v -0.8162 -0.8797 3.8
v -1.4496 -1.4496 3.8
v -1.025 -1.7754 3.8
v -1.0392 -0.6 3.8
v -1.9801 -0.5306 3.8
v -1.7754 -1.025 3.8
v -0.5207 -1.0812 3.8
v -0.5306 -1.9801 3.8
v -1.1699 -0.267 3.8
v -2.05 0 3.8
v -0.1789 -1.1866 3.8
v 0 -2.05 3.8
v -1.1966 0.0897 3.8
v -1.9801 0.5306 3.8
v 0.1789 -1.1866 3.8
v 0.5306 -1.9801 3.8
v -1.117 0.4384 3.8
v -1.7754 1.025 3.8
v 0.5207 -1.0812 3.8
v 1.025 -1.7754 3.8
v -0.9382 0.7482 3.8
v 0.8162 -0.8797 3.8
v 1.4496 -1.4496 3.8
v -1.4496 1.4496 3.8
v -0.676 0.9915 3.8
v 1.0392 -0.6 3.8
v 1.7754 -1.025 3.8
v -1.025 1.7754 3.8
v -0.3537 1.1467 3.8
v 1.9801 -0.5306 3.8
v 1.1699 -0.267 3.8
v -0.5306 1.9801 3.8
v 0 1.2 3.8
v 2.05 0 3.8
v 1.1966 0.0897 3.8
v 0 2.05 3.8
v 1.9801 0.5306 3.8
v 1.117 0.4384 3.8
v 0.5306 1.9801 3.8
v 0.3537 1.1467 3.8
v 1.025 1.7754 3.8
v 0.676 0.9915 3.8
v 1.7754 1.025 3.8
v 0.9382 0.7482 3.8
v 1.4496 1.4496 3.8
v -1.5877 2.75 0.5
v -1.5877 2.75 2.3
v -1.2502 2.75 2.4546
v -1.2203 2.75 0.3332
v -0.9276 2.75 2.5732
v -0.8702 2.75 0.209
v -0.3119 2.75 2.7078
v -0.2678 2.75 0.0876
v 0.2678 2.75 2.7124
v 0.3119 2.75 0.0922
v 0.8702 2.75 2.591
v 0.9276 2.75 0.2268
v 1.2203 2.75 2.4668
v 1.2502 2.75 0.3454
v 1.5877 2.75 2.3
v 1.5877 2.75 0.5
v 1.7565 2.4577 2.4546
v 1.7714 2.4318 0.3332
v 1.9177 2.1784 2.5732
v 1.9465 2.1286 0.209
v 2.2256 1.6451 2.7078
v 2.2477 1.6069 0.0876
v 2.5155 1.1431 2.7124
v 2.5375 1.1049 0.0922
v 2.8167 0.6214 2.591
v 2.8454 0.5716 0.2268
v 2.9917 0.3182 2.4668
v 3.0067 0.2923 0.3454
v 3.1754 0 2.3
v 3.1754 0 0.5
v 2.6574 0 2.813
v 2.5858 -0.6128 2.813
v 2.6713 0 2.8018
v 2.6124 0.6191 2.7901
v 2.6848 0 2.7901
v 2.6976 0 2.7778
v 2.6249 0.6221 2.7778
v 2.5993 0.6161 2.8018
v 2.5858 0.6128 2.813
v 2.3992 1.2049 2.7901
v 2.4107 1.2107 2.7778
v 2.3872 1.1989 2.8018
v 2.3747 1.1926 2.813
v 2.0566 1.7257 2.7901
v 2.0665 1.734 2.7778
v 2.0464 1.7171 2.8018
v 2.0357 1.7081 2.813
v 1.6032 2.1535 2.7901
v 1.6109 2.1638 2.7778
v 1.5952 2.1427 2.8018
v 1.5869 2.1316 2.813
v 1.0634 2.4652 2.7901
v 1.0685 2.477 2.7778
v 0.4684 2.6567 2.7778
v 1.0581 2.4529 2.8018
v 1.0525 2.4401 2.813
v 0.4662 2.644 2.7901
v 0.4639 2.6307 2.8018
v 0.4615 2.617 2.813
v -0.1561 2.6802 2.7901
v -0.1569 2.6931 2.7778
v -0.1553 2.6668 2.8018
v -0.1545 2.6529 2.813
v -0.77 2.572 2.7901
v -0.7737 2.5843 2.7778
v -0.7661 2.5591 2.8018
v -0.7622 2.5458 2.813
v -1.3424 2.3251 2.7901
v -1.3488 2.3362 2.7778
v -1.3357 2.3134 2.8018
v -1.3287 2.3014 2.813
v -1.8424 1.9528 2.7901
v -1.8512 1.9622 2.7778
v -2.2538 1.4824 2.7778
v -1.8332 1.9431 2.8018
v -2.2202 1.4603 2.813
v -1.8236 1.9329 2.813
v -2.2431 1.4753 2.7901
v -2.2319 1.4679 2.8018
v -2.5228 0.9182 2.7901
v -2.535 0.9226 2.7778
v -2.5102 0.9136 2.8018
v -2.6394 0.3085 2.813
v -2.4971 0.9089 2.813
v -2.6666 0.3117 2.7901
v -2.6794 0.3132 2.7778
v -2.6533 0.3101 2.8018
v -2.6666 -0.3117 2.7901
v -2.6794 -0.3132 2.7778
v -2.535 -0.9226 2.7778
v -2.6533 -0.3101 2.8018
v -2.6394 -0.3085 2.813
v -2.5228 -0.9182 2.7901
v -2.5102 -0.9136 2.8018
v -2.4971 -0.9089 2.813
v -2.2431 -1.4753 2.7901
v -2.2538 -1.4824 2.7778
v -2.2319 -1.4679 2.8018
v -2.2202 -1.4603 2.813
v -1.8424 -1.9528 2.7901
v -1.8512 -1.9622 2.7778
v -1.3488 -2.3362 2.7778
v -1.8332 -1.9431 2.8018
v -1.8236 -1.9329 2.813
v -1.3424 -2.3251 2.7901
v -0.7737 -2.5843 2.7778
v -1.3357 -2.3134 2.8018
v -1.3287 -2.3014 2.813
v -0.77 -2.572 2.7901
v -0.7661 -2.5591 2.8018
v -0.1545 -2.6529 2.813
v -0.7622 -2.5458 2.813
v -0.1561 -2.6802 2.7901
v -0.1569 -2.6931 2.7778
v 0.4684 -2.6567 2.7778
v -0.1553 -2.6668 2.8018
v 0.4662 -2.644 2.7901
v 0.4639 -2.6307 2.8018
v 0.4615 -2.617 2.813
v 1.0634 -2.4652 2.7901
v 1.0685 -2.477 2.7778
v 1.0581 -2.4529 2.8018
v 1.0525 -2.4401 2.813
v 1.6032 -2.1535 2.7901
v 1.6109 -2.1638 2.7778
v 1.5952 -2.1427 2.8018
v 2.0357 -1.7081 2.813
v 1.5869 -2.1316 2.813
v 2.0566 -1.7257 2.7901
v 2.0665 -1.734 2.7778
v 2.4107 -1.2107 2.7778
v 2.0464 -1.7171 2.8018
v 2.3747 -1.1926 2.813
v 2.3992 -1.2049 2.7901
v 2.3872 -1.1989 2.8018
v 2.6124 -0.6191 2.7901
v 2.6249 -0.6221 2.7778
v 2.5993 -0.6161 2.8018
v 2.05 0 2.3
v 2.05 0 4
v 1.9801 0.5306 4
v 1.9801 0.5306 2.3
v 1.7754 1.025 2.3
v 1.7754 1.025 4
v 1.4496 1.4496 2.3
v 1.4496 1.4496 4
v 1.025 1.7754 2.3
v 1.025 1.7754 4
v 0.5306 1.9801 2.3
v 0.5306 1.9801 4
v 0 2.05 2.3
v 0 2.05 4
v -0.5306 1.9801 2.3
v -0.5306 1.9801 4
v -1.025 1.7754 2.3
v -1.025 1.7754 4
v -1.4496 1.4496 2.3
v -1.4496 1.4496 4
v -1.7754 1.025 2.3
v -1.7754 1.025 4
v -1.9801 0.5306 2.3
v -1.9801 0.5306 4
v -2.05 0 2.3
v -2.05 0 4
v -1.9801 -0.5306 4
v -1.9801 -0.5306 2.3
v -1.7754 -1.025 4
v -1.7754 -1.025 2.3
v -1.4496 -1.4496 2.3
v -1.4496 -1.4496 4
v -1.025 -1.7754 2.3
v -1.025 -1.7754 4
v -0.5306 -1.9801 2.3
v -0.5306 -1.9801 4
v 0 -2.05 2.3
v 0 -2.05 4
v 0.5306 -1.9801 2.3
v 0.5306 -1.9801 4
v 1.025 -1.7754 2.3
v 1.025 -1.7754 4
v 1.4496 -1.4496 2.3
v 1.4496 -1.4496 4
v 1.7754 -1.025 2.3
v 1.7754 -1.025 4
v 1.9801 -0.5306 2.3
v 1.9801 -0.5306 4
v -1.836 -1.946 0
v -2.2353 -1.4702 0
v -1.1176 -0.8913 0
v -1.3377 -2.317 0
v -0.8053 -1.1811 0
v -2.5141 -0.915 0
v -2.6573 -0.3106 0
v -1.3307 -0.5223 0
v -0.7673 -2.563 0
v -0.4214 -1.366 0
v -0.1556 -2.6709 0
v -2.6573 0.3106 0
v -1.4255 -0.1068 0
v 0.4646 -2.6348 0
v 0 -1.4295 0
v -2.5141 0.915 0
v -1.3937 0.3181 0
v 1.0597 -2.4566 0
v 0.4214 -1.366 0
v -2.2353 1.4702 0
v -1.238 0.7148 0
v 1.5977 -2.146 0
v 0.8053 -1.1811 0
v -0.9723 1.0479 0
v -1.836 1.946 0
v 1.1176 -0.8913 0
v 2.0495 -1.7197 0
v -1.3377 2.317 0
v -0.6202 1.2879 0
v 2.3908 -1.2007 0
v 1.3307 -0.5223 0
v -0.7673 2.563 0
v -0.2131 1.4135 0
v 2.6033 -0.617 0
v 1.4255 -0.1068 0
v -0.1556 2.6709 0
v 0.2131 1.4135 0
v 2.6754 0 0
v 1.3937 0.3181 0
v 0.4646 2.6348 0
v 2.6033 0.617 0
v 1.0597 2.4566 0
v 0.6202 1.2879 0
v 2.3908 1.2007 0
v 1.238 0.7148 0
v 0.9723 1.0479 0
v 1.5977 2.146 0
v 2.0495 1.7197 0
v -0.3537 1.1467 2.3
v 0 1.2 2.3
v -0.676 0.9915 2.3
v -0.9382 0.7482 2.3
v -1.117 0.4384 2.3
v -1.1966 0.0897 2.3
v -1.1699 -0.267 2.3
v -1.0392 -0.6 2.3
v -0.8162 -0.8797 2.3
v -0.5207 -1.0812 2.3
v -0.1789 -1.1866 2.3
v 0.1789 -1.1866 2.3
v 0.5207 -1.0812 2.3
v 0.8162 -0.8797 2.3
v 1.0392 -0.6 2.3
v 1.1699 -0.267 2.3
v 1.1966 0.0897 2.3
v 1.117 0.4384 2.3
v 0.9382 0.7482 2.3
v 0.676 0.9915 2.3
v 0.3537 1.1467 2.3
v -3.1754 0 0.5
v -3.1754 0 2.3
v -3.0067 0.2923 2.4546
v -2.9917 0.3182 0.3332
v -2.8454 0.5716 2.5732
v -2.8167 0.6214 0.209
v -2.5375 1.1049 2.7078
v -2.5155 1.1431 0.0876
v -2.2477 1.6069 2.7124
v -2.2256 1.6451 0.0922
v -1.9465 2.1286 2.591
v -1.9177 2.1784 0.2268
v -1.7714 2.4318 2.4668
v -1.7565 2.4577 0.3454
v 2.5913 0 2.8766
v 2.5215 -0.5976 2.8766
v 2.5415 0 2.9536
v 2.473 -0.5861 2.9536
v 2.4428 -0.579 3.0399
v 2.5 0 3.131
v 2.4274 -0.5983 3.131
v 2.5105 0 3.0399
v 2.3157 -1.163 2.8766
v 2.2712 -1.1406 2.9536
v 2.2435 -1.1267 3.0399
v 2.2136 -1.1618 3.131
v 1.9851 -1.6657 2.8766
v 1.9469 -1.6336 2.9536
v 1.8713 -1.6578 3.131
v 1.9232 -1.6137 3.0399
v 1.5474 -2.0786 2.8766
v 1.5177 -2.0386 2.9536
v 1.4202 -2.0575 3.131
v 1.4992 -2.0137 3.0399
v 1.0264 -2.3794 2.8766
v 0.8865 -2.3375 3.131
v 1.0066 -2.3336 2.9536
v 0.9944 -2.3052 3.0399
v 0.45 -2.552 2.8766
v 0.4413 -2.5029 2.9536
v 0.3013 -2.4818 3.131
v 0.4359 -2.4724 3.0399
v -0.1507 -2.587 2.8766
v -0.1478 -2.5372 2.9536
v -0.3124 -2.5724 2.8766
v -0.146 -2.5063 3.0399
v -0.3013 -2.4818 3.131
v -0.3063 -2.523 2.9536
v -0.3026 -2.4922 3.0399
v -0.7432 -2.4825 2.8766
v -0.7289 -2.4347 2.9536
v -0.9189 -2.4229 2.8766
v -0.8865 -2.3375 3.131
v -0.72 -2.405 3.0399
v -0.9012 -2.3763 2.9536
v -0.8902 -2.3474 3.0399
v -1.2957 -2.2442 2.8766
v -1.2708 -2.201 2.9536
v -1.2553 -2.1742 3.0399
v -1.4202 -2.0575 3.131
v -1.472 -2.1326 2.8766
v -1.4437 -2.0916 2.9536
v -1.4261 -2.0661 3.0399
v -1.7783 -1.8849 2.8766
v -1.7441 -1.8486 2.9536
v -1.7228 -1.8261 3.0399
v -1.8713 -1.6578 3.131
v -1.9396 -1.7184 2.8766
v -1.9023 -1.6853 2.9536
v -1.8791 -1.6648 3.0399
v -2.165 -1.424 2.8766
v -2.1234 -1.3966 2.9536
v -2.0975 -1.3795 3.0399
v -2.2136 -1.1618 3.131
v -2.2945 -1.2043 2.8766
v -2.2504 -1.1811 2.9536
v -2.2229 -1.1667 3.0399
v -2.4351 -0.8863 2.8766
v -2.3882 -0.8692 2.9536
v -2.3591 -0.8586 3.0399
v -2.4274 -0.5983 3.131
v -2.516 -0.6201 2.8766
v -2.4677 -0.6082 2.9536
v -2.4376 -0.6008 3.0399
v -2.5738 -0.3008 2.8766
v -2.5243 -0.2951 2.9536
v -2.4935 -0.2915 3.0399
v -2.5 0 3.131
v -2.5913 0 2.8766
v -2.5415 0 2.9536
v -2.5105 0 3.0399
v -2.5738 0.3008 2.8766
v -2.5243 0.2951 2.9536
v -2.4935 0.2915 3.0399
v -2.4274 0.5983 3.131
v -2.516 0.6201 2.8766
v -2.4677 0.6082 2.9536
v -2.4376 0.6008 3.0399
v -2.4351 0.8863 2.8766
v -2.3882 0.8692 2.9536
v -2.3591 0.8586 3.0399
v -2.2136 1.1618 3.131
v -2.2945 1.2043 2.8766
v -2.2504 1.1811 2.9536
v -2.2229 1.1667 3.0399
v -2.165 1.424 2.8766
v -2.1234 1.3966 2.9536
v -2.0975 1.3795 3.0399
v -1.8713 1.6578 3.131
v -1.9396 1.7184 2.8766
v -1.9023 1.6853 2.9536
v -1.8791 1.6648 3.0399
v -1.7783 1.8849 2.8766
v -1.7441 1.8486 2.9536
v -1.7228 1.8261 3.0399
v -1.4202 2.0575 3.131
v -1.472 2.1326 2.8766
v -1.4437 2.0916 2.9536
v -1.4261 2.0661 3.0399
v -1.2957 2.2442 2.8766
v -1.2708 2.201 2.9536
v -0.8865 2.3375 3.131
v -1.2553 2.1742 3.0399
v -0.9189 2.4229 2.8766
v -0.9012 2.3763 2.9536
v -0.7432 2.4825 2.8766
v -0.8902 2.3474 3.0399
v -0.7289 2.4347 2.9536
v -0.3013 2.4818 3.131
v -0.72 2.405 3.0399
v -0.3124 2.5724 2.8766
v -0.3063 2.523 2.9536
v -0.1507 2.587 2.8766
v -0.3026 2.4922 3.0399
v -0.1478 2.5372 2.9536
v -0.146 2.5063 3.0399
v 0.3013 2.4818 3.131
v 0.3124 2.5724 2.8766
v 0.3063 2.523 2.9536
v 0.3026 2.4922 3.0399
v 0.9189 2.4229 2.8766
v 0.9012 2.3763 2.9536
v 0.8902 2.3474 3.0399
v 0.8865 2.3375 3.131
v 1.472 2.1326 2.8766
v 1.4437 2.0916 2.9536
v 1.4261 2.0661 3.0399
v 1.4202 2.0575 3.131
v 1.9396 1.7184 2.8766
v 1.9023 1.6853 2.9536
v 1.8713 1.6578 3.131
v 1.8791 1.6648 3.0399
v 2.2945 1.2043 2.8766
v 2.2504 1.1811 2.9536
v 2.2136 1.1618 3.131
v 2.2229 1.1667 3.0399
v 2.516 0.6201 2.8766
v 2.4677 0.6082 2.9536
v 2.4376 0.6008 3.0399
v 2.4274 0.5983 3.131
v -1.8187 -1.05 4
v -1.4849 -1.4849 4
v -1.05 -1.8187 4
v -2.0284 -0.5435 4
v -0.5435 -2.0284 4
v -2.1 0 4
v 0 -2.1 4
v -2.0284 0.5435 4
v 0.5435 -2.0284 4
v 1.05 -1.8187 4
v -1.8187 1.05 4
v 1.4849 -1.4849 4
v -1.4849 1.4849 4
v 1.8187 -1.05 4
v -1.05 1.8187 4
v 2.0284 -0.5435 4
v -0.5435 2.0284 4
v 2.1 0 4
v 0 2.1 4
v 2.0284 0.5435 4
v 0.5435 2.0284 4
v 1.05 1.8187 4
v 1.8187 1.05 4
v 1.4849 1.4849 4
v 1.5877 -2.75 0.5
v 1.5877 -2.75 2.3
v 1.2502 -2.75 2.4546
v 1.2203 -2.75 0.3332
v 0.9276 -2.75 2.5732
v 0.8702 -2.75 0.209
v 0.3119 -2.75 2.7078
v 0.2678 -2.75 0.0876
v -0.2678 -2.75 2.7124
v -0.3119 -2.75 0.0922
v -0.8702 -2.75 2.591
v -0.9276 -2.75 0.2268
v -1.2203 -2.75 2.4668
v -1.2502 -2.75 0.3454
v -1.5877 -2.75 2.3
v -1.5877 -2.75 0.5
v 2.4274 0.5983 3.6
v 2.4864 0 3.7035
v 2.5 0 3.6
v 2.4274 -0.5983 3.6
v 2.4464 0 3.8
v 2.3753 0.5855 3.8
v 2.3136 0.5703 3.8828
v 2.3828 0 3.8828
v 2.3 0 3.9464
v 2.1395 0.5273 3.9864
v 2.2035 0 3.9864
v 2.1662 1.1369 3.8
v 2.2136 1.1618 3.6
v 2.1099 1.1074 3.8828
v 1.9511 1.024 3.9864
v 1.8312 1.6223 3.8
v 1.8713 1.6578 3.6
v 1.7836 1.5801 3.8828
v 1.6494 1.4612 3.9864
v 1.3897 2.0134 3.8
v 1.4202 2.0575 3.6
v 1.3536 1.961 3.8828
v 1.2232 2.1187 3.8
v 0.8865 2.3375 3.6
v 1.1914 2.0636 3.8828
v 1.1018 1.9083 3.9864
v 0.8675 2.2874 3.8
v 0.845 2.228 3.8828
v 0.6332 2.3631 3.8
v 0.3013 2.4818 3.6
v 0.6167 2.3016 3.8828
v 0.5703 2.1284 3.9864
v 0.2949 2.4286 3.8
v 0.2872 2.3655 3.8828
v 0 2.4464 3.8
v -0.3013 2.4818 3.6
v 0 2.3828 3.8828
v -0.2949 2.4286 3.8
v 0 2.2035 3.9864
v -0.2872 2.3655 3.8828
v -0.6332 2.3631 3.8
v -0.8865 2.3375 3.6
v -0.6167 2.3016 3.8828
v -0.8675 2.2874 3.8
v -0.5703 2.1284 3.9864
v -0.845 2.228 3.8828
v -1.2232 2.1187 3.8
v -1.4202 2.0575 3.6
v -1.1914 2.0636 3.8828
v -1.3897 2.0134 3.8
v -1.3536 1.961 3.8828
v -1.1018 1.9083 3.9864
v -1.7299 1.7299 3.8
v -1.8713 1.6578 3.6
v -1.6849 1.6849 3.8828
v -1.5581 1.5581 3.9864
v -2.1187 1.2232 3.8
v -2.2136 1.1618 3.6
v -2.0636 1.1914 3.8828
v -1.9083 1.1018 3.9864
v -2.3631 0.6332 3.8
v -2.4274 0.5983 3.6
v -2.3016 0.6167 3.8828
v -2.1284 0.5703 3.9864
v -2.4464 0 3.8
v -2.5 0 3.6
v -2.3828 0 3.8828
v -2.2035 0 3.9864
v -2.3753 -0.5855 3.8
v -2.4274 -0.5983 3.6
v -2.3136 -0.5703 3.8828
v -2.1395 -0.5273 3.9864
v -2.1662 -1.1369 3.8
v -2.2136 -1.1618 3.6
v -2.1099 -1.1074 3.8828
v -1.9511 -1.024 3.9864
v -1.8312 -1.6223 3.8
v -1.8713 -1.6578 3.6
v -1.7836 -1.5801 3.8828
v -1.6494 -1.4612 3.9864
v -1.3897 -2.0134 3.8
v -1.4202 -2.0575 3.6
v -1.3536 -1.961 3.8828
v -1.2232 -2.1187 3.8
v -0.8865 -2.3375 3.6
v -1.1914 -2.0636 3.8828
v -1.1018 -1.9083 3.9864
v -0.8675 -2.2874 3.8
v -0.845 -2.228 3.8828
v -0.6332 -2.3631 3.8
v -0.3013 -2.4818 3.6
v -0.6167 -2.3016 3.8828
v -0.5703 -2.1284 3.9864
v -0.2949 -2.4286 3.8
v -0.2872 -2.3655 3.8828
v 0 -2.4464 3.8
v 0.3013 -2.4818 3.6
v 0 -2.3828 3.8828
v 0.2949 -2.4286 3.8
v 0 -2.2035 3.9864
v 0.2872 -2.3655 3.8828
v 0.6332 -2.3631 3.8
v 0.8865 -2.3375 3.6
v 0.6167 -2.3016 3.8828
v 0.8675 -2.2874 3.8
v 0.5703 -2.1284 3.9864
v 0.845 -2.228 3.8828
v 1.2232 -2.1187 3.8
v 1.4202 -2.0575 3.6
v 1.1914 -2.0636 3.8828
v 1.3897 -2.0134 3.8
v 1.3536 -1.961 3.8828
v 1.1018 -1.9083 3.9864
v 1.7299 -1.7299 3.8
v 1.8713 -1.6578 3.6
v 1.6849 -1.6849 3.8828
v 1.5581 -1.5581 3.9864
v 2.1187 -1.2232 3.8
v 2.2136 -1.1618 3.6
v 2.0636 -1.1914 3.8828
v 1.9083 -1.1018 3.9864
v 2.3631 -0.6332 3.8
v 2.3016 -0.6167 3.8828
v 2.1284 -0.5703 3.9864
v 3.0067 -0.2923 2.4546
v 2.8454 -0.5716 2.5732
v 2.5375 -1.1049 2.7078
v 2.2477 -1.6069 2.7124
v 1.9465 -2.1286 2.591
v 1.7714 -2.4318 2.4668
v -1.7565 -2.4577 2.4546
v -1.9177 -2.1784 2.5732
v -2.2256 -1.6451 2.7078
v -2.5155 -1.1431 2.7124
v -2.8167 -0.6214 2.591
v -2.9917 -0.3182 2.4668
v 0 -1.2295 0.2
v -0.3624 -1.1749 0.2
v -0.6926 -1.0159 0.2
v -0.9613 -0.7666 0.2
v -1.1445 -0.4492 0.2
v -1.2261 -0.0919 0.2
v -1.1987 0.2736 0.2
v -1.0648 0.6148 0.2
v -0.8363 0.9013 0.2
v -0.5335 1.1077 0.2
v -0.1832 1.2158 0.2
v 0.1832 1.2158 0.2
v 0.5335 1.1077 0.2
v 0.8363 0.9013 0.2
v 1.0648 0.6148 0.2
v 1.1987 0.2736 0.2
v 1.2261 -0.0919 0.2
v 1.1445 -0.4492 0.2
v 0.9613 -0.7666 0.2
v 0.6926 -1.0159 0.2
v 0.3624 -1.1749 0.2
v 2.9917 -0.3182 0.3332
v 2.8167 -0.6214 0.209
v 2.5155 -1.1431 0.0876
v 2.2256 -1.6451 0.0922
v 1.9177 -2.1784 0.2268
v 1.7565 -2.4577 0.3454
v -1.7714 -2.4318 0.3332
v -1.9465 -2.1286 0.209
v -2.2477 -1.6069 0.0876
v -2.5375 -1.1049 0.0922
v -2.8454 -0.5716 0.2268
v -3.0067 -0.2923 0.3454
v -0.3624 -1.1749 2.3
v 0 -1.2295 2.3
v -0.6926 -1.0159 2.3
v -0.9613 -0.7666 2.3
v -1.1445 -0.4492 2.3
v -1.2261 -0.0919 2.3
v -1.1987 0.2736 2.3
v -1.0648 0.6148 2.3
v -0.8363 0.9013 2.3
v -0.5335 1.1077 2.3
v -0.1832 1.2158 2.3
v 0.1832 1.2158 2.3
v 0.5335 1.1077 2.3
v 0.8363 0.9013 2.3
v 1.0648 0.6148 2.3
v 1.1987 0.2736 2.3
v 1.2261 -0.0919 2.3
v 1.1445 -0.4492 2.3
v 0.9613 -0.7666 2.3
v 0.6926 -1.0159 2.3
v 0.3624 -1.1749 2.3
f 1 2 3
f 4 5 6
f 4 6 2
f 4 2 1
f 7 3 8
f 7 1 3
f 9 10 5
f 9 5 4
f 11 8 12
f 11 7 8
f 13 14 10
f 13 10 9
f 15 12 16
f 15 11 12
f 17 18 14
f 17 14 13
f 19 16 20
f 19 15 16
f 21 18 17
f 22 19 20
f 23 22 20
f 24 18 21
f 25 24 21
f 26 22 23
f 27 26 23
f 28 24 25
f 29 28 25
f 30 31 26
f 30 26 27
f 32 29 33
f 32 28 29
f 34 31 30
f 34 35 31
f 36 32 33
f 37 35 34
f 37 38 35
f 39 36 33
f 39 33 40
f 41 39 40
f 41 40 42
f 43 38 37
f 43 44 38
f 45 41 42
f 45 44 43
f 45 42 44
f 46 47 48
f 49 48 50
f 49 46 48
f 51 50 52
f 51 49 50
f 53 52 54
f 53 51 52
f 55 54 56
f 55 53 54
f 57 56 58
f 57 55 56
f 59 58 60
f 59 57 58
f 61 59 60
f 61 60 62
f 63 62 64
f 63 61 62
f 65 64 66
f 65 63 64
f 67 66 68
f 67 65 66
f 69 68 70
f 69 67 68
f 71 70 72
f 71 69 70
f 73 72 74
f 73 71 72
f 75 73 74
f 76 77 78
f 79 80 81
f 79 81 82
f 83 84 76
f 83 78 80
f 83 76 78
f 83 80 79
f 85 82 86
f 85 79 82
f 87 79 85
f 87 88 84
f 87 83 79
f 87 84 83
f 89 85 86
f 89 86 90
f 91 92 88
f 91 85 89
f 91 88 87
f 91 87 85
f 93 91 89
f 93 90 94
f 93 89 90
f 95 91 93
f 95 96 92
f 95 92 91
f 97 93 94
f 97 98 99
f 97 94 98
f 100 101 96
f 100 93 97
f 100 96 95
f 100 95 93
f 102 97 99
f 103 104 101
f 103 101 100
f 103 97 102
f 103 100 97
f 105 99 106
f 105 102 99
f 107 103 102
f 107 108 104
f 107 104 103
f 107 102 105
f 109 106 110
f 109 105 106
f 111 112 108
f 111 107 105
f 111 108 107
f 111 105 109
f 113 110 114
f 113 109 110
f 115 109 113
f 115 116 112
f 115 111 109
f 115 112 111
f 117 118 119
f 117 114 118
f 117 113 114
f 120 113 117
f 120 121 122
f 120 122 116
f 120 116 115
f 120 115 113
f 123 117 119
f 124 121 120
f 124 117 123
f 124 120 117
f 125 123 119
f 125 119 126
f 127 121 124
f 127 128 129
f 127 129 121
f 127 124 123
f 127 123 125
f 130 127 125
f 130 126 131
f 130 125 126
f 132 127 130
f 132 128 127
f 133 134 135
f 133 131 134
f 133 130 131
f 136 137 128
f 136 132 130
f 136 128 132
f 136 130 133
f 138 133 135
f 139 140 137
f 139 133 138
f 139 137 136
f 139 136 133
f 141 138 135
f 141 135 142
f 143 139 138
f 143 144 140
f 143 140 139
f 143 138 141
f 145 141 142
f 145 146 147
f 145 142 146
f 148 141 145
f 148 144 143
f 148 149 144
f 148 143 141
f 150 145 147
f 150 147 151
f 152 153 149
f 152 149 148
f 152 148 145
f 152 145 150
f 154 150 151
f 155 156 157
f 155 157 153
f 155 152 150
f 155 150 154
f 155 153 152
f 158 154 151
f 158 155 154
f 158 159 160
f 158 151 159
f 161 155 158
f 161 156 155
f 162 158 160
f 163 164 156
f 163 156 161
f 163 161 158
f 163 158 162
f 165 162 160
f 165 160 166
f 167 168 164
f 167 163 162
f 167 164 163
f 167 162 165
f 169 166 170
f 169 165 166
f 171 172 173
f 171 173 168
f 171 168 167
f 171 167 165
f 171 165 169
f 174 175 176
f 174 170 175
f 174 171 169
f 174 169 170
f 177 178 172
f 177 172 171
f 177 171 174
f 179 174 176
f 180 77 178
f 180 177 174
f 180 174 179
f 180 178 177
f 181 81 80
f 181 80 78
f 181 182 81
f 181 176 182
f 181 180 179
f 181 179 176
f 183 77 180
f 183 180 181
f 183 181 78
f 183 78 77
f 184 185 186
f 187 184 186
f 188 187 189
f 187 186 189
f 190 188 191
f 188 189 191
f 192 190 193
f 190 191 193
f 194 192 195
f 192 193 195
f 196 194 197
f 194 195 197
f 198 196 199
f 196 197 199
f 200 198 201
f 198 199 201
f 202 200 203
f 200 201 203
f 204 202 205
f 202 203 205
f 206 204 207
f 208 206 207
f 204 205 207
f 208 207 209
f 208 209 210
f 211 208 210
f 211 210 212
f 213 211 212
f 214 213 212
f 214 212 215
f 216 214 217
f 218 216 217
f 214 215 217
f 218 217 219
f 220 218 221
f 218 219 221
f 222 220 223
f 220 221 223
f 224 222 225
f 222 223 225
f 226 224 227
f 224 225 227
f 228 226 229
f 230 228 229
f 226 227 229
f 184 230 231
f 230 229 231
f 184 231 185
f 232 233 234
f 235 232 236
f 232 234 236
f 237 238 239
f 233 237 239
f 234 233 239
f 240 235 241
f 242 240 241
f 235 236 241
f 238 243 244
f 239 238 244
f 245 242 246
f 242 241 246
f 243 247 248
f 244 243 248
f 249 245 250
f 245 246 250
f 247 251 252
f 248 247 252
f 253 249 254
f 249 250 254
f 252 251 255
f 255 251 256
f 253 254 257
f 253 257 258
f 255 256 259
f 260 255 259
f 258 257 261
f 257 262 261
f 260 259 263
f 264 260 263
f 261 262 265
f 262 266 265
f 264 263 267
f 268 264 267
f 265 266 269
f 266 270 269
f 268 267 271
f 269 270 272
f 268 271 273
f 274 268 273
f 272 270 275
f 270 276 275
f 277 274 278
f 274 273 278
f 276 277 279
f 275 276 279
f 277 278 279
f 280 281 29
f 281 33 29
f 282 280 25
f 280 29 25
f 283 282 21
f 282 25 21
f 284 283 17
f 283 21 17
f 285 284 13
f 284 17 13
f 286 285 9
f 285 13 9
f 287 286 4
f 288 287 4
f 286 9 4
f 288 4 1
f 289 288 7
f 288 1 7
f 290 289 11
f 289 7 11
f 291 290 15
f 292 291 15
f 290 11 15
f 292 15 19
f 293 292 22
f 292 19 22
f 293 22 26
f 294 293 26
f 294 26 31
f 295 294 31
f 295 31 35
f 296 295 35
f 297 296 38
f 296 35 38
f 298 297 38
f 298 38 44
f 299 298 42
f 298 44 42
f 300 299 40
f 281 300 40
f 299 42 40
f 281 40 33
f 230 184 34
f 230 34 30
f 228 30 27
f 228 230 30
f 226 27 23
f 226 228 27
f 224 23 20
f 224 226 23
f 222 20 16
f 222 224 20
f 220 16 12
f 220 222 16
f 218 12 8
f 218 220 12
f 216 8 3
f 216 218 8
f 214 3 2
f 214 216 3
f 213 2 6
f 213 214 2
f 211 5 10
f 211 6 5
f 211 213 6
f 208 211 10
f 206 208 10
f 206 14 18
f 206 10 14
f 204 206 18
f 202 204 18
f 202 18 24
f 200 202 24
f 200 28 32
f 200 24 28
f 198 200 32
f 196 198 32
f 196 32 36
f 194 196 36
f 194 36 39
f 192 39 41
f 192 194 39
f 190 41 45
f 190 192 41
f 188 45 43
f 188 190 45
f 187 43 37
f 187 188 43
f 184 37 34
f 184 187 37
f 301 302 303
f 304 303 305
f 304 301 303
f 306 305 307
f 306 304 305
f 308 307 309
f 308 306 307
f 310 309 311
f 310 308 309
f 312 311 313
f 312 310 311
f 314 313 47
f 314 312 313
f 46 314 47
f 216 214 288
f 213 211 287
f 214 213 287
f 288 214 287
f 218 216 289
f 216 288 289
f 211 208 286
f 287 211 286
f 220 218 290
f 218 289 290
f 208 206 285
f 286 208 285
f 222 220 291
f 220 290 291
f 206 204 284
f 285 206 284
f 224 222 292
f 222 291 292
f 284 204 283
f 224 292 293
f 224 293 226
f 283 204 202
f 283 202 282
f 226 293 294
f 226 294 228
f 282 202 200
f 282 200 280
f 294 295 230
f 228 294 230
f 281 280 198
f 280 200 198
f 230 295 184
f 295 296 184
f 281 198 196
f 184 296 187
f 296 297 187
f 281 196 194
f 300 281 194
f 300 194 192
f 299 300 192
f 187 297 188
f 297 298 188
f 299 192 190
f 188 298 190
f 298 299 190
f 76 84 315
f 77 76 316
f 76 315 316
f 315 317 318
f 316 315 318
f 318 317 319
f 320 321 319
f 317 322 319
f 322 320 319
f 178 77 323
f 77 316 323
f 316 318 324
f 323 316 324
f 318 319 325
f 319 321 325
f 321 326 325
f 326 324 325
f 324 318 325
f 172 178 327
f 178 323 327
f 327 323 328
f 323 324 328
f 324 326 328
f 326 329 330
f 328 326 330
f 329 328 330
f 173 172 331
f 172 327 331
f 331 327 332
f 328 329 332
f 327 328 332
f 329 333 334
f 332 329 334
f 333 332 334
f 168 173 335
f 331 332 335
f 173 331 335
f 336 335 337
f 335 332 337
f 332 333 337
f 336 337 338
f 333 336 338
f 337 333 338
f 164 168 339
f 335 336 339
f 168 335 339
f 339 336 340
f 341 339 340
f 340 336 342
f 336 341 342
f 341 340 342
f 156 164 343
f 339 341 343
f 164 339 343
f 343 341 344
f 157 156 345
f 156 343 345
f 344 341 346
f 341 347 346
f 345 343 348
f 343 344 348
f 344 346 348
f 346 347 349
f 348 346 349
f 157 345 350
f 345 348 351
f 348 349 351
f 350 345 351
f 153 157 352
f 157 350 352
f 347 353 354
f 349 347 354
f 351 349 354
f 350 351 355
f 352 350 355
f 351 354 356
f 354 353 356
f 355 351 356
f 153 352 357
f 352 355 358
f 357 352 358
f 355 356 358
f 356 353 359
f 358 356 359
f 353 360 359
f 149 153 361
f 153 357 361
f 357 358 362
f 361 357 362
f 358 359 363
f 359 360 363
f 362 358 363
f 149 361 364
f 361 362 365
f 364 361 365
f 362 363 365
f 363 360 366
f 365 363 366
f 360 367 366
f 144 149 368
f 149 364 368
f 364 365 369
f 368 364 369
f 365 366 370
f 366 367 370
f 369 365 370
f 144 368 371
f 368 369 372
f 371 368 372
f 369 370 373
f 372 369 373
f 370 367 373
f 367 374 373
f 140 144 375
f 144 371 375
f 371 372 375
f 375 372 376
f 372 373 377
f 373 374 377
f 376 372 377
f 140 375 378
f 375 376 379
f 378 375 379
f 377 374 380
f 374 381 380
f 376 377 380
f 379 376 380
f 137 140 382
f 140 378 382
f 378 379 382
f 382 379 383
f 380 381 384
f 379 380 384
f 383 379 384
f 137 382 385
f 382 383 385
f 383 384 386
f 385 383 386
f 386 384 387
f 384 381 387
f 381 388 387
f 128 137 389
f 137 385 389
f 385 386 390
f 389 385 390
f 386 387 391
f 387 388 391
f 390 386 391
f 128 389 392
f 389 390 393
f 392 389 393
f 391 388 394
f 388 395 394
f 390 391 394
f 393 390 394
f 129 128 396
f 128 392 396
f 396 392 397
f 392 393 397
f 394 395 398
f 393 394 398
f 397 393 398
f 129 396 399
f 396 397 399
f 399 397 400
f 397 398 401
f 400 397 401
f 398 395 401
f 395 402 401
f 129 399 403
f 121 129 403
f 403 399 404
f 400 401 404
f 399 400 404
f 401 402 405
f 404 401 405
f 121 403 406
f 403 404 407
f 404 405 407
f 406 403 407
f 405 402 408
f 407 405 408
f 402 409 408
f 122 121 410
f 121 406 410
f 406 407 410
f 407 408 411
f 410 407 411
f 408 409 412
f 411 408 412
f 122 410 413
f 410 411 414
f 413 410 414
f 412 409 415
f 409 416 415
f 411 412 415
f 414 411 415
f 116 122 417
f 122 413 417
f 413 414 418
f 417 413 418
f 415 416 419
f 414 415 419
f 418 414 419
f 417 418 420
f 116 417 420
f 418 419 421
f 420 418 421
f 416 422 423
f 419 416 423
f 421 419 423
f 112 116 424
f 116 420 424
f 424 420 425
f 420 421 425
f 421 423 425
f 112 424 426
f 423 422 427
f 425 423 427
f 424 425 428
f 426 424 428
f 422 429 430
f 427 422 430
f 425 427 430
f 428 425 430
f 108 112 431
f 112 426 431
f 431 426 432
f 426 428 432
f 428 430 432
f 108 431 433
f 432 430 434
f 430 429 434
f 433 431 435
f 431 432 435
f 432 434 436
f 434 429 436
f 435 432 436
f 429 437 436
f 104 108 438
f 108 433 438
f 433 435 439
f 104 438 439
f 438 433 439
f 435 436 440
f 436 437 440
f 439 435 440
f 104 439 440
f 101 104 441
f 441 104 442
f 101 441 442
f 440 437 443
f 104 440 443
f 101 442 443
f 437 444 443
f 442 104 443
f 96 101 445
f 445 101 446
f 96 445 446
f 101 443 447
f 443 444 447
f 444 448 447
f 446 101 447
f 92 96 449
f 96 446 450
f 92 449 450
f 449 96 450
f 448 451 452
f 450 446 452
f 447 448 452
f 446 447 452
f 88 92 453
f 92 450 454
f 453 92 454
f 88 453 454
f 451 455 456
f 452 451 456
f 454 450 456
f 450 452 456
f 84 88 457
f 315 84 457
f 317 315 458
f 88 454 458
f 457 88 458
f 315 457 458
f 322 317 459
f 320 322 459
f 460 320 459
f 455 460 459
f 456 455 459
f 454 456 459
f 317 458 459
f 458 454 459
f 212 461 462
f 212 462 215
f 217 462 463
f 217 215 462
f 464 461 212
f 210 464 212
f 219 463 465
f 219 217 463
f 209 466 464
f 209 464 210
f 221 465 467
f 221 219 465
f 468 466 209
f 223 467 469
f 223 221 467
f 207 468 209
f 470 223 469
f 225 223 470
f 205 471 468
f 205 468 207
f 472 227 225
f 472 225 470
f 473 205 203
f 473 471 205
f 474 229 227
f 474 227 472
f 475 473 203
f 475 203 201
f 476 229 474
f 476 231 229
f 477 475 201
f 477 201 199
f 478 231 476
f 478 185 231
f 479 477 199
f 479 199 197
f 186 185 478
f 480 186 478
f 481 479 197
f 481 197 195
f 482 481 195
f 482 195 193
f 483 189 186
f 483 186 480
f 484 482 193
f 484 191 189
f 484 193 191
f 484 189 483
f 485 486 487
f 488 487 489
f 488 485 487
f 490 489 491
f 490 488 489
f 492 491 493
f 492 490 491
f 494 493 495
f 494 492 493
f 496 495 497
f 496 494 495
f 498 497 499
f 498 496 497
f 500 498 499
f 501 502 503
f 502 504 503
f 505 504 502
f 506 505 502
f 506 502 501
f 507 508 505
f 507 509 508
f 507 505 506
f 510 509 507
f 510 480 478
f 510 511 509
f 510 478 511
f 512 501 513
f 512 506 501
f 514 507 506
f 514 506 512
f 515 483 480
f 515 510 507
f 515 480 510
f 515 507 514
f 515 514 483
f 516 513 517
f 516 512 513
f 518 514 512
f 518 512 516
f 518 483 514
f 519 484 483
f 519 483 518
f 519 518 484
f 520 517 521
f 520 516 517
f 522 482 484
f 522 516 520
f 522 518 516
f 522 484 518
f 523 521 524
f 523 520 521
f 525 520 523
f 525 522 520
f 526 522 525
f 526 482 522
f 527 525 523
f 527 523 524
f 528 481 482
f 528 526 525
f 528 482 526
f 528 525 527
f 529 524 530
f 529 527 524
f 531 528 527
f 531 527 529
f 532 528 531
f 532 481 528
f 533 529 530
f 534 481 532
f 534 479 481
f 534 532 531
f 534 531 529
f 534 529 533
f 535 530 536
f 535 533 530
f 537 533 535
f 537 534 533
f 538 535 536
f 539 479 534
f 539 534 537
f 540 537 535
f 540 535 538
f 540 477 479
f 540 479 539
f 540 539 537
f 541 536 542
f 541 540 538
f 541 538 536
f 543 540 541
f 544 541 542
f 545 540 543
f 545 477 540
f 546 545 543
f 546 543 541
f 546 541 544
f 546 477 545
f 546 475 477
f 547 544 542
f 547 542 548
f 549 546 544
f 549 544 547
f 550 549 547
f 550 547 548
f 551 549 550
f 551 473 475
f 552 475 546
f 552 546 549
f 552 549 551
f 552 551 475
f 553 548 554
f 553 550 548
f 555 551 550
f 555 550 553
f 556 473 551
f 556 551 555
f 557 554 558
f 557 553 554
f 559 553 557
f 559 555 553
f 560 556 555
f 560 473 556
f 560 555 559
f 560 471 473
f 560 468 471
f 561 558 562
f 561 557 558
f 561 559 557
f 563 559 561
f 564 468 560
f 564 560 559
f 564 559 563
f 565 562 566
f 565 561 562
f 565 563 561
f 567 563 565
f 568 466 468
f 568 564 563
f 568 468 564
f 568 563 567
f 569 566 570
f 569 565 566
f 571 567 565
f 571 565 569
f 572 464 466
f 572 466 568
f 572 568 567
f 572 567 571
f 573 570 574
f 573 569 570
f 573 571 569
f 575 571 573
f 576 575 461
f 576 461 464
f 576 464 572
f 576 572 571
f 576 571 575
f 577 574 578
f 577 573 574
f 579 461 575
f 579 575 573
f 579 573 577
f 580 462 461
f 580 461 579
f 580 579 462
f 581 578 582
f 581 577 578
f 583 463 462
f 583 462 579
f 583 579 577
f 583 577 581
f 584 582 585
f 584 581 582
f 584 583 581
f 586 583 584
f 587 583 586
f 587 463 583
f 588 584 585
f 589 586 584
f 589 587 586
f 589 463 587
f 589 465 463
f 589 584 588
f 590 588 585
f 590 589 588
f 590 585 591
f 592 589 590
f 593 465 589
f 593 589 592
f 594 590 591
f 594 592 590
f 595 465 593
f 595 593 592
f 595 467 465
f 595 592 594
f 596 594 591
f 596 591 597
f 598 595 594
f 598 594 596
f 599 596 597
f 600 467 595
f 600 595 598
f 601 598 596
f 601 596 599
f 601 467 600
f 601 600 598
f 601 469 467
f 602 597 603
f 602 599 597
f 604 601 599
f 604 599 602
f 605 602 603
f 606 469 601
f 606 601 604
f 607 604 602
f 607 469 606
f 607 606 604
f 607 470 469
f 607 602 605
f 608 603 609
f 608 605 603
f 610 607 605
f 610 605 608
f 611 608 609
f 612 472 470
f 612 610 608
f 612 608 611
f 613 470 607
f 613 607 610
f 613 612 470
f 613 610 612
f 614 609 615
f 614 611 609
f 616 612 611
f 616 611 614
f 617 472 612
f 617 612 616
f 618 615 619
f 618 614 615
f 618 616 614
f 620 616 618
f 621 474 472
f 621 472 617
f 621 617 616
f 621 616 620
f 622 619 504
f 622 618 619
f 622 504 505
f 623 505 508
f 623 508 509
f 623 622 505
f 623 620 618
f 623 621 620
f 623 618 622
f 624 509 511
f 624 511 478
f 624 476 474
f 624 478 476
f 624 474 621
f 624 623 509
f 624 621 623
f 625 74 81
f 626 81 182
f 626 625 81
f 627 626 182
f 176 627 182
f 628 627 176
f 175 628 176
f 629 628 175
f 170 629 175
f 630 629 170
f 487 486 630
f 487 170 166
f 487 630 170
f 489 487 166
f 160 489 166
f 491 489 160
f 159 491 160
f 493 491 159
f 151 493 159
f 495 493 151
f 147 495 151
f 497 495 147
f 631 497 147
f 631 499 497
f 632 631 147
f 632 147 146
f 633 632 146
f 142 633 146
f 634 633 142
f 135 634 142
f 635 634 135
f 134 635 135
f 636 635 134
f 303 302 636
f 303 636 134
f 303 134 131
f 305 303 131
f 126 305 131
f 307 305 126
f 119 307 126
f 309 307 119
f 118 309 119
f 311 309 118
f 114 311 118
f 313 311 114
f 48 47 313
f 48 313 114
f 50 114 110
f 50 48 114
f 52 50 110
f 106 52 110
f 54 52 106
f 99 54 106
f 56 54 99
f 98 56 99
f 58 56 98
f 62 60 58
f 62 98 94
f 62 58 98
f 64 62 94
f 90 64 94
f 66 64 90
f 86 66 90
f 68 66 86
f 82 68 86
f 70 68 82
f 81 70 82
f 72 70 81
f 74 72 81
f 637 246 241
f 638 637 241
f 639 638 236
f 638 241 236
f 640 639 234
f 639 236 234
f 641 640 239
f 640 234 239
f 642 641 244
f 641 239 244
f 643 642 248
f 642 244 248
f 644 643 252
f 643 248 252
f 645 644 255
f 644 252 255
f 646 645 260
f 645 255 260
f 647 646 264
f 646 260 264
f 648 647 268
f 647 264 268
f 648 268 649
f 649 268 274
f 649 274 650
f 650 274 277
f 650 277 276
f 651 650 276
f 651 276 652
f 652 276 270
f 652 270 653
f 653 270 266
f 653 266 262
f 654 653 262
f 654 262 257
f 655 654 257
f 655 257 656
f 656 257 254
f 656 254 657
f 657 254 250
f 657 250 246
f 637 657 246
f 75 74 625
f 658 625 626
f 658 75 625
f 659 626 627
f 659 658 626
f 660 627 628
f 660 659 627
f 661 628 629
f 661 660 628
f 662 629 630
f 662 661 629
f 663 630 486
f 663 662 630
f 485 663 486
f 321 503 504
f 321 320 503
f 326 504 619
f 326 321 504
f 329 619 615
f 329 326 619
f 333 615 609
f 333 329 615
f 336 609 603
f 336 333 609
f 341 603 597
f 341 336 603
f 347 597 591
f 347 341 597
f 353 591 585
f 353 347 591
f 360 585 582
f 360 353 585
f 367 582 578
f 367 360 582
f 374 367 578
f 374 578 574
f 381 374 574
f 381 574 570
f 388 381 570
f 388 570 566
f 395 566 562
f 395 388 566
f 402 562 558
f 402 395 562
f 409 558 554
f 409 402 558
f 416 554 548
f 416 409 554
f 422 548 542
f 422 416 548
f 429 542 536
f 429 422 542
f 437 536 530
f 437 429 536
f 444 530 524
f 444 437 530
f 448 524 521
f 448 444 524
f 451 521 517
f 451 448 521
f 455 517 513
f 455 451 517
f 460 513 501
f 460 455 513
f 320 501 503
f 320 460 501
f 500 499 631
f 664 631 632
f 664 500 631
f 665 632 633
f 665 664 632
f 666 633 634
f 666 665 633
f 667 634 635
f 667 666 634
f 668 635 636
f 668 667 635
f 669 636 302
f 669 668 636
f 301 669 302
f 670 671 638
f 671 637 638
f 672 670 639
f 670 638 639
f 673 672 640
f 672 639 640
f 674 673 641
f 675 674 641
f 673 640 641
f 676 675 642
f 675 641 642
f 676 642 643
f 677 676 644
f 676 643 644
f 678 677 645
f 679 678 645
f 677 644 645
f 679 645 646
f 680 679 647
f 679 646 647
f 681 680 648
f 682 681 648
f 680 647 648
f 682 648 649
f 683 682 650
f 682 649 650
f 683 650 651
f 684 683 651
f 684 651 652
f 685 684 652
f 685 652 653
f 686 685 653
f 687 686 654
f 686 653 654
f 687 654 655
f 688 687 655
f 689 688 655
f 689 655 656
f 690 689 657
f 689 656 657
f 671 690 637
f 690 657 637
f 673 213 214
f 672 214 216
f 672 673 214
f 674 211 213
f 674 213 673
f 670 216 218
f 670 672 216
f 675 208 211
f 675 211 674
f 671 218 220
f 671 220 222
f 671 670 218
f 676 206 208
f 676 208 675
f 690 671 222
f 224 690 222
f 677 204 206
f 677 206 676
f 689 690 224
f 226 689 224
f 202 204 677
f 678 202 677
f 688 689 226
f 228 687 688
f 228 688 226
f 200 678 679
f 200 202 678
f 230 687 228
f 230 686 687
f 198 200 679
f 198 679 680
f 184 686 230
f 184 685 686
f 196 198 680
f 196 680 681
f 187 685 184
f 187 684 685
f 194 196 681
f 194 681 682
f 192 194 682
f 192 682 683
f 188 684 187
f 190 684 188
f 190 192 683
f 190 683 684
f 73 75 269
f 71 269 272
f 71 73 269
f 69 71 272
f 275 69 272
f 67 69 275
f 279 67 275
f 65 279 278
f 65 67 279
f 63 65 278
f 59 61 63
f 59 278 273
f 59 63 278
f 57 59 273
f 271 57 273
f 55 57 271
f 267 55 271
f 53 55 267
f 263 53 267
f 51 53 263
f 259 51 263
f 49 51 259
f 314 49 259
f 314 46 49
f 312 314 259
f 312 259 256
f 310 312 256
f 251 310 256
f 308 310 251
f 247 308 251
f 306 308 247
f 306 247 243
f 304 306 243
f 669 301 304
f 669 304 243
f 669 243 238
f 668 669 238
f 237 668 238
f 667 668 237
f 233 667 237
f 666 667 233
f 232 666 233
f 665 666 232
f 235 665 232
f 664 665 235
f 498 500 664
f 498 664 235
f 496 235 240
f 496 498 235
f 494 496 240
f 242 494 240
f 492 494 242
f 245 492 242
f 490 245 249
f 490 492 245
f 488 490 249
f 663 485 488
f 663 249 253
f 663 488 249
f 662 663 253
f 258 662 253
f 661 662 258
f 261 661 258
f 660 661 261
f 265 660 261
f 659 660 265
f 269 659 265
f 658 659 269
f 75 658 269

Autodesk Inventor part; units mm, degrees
ref_plane "YZ Plane" through (0, 0, 0) normal (1, 0, 0) x (0, 1, 0)
ref_plane "XZ Plane" through (0, 0, 0) normal (0, 1, 0) x (-1, 0, 0)
ref_plane "XY Plane" through (0, 0, 0) normal (0, 0, 1) x (1, 0, 0)
sketch "Sketch1" plane through (0, 0, 0) normal (0, 0, 1) x (1, 0, 0)
  circle A0 centre (0, 0) radius 3.175426
  line L0 (-1.587713, 2.75) -> (1.587713, 2.75)
  line L1 (1.587713, 2.75) -> (3.175426, 0)
  line L2 (3.175426, 0) -> (1.587713, -2.75)
  line L3 (1.587713, -2.75) -> (-1.587713, -2.75)
  line L4 (-1.587713, -2.75) -> (-3.175426, 0)
  line L5 (-3.175426, 0) -> (-1.587713, 2.75)
  point P0 (-3.175426, 0)
  point P1 (-3.175426, 0)
  point P2 (-1.587713, 2.75)
  point P3 (-1.587713, 2.75)
  point P4 (-1.587713, -2.75)
  point P5 (-1.587713, -2.75)
  point P6 (3.175426, 0)
  point P7 (3.175426, 0)
  point P8 (1.587713, -2.75)
  dimension "d0" = 5.5
extrude "Extrusion1" add sketch "Sketch1" along normal blind 2.8
chamfer "Chamfer1" distance 0.5 angle 45 2 edges at (-3.1754, 0, 0) (-3.1754, 0, 2.8)
extrude "Extrusion2" cut sketch "Sketch1" along normal through all contours L1 A0 | A0 L2 | L0 A0 | A0 L3 | L5 A0 | A0 L4
sketch "Sketch2" plane through (0, 0, 2.8) normal (0, 0, 1) x (1, 0, 0)
  circle A0 centre (0, 0) radius 2.675426
  circle A1 centre (0, 0) radius 2.5
  dimension "d9" = 5
extrude "Extrusion3" add sketch "Sketch2" along normal blind 1.2 contours A1
fillet "Fillet1" radius 0.4 3 edges at (-2.5, 0, 2.8) (-2.6754, 0, 2.8) (-2.5, 0, 4)
sketch "Sketch3" plane through (0, 0, 4) normal (0, 0, 1) x (1, 0, 0)
  circle A0 centre (0, 0) radius 2.05
  dimension "d13" = 4.1
extrude "Extrusion4" cut sketch "Sketch3" against normal blind 1.7
sketch "Sketch4" plane through (0, 0, 2.3) normal (0, 0, 1) x (1, 0, 0)
  circle A0 centre (0, 0) radius 2.05 projected
extrude "Extrusion5" add sketch "Sketch4" along normal blind 1.5 separate body
sketch "Sketch5" plane through (0, 0, 3.8) normal (0, 0, 1) x (1, 0, 0)
  circle A0 centre (0, 0) radius 2.05 projected
hole "Hole1" at (0, 0, 3.8) direction (0, 0, -1) diameter 2.459 end through all bodies 1 thread size "M3x0.5" class "6H" standard "ANSI Metric M Profile"
sketch "Sketch6" plane through (0, 0, 2.3) normal (0, 0, -1) x (-1, 0, 0)
  circle A0 centre (0, 0) radius 1.2295 projected
hole "Hole2" at (0, 0, 2.3) direction (0, 0, 1) diameter 2.4 end through all bodies 2
chamfer "Chamfer2" distance 0.2 angle 45 1 edges at (0, 1.2295, 0)
properties part number "M3 LOCKNUT" material "Stainless Steel"
